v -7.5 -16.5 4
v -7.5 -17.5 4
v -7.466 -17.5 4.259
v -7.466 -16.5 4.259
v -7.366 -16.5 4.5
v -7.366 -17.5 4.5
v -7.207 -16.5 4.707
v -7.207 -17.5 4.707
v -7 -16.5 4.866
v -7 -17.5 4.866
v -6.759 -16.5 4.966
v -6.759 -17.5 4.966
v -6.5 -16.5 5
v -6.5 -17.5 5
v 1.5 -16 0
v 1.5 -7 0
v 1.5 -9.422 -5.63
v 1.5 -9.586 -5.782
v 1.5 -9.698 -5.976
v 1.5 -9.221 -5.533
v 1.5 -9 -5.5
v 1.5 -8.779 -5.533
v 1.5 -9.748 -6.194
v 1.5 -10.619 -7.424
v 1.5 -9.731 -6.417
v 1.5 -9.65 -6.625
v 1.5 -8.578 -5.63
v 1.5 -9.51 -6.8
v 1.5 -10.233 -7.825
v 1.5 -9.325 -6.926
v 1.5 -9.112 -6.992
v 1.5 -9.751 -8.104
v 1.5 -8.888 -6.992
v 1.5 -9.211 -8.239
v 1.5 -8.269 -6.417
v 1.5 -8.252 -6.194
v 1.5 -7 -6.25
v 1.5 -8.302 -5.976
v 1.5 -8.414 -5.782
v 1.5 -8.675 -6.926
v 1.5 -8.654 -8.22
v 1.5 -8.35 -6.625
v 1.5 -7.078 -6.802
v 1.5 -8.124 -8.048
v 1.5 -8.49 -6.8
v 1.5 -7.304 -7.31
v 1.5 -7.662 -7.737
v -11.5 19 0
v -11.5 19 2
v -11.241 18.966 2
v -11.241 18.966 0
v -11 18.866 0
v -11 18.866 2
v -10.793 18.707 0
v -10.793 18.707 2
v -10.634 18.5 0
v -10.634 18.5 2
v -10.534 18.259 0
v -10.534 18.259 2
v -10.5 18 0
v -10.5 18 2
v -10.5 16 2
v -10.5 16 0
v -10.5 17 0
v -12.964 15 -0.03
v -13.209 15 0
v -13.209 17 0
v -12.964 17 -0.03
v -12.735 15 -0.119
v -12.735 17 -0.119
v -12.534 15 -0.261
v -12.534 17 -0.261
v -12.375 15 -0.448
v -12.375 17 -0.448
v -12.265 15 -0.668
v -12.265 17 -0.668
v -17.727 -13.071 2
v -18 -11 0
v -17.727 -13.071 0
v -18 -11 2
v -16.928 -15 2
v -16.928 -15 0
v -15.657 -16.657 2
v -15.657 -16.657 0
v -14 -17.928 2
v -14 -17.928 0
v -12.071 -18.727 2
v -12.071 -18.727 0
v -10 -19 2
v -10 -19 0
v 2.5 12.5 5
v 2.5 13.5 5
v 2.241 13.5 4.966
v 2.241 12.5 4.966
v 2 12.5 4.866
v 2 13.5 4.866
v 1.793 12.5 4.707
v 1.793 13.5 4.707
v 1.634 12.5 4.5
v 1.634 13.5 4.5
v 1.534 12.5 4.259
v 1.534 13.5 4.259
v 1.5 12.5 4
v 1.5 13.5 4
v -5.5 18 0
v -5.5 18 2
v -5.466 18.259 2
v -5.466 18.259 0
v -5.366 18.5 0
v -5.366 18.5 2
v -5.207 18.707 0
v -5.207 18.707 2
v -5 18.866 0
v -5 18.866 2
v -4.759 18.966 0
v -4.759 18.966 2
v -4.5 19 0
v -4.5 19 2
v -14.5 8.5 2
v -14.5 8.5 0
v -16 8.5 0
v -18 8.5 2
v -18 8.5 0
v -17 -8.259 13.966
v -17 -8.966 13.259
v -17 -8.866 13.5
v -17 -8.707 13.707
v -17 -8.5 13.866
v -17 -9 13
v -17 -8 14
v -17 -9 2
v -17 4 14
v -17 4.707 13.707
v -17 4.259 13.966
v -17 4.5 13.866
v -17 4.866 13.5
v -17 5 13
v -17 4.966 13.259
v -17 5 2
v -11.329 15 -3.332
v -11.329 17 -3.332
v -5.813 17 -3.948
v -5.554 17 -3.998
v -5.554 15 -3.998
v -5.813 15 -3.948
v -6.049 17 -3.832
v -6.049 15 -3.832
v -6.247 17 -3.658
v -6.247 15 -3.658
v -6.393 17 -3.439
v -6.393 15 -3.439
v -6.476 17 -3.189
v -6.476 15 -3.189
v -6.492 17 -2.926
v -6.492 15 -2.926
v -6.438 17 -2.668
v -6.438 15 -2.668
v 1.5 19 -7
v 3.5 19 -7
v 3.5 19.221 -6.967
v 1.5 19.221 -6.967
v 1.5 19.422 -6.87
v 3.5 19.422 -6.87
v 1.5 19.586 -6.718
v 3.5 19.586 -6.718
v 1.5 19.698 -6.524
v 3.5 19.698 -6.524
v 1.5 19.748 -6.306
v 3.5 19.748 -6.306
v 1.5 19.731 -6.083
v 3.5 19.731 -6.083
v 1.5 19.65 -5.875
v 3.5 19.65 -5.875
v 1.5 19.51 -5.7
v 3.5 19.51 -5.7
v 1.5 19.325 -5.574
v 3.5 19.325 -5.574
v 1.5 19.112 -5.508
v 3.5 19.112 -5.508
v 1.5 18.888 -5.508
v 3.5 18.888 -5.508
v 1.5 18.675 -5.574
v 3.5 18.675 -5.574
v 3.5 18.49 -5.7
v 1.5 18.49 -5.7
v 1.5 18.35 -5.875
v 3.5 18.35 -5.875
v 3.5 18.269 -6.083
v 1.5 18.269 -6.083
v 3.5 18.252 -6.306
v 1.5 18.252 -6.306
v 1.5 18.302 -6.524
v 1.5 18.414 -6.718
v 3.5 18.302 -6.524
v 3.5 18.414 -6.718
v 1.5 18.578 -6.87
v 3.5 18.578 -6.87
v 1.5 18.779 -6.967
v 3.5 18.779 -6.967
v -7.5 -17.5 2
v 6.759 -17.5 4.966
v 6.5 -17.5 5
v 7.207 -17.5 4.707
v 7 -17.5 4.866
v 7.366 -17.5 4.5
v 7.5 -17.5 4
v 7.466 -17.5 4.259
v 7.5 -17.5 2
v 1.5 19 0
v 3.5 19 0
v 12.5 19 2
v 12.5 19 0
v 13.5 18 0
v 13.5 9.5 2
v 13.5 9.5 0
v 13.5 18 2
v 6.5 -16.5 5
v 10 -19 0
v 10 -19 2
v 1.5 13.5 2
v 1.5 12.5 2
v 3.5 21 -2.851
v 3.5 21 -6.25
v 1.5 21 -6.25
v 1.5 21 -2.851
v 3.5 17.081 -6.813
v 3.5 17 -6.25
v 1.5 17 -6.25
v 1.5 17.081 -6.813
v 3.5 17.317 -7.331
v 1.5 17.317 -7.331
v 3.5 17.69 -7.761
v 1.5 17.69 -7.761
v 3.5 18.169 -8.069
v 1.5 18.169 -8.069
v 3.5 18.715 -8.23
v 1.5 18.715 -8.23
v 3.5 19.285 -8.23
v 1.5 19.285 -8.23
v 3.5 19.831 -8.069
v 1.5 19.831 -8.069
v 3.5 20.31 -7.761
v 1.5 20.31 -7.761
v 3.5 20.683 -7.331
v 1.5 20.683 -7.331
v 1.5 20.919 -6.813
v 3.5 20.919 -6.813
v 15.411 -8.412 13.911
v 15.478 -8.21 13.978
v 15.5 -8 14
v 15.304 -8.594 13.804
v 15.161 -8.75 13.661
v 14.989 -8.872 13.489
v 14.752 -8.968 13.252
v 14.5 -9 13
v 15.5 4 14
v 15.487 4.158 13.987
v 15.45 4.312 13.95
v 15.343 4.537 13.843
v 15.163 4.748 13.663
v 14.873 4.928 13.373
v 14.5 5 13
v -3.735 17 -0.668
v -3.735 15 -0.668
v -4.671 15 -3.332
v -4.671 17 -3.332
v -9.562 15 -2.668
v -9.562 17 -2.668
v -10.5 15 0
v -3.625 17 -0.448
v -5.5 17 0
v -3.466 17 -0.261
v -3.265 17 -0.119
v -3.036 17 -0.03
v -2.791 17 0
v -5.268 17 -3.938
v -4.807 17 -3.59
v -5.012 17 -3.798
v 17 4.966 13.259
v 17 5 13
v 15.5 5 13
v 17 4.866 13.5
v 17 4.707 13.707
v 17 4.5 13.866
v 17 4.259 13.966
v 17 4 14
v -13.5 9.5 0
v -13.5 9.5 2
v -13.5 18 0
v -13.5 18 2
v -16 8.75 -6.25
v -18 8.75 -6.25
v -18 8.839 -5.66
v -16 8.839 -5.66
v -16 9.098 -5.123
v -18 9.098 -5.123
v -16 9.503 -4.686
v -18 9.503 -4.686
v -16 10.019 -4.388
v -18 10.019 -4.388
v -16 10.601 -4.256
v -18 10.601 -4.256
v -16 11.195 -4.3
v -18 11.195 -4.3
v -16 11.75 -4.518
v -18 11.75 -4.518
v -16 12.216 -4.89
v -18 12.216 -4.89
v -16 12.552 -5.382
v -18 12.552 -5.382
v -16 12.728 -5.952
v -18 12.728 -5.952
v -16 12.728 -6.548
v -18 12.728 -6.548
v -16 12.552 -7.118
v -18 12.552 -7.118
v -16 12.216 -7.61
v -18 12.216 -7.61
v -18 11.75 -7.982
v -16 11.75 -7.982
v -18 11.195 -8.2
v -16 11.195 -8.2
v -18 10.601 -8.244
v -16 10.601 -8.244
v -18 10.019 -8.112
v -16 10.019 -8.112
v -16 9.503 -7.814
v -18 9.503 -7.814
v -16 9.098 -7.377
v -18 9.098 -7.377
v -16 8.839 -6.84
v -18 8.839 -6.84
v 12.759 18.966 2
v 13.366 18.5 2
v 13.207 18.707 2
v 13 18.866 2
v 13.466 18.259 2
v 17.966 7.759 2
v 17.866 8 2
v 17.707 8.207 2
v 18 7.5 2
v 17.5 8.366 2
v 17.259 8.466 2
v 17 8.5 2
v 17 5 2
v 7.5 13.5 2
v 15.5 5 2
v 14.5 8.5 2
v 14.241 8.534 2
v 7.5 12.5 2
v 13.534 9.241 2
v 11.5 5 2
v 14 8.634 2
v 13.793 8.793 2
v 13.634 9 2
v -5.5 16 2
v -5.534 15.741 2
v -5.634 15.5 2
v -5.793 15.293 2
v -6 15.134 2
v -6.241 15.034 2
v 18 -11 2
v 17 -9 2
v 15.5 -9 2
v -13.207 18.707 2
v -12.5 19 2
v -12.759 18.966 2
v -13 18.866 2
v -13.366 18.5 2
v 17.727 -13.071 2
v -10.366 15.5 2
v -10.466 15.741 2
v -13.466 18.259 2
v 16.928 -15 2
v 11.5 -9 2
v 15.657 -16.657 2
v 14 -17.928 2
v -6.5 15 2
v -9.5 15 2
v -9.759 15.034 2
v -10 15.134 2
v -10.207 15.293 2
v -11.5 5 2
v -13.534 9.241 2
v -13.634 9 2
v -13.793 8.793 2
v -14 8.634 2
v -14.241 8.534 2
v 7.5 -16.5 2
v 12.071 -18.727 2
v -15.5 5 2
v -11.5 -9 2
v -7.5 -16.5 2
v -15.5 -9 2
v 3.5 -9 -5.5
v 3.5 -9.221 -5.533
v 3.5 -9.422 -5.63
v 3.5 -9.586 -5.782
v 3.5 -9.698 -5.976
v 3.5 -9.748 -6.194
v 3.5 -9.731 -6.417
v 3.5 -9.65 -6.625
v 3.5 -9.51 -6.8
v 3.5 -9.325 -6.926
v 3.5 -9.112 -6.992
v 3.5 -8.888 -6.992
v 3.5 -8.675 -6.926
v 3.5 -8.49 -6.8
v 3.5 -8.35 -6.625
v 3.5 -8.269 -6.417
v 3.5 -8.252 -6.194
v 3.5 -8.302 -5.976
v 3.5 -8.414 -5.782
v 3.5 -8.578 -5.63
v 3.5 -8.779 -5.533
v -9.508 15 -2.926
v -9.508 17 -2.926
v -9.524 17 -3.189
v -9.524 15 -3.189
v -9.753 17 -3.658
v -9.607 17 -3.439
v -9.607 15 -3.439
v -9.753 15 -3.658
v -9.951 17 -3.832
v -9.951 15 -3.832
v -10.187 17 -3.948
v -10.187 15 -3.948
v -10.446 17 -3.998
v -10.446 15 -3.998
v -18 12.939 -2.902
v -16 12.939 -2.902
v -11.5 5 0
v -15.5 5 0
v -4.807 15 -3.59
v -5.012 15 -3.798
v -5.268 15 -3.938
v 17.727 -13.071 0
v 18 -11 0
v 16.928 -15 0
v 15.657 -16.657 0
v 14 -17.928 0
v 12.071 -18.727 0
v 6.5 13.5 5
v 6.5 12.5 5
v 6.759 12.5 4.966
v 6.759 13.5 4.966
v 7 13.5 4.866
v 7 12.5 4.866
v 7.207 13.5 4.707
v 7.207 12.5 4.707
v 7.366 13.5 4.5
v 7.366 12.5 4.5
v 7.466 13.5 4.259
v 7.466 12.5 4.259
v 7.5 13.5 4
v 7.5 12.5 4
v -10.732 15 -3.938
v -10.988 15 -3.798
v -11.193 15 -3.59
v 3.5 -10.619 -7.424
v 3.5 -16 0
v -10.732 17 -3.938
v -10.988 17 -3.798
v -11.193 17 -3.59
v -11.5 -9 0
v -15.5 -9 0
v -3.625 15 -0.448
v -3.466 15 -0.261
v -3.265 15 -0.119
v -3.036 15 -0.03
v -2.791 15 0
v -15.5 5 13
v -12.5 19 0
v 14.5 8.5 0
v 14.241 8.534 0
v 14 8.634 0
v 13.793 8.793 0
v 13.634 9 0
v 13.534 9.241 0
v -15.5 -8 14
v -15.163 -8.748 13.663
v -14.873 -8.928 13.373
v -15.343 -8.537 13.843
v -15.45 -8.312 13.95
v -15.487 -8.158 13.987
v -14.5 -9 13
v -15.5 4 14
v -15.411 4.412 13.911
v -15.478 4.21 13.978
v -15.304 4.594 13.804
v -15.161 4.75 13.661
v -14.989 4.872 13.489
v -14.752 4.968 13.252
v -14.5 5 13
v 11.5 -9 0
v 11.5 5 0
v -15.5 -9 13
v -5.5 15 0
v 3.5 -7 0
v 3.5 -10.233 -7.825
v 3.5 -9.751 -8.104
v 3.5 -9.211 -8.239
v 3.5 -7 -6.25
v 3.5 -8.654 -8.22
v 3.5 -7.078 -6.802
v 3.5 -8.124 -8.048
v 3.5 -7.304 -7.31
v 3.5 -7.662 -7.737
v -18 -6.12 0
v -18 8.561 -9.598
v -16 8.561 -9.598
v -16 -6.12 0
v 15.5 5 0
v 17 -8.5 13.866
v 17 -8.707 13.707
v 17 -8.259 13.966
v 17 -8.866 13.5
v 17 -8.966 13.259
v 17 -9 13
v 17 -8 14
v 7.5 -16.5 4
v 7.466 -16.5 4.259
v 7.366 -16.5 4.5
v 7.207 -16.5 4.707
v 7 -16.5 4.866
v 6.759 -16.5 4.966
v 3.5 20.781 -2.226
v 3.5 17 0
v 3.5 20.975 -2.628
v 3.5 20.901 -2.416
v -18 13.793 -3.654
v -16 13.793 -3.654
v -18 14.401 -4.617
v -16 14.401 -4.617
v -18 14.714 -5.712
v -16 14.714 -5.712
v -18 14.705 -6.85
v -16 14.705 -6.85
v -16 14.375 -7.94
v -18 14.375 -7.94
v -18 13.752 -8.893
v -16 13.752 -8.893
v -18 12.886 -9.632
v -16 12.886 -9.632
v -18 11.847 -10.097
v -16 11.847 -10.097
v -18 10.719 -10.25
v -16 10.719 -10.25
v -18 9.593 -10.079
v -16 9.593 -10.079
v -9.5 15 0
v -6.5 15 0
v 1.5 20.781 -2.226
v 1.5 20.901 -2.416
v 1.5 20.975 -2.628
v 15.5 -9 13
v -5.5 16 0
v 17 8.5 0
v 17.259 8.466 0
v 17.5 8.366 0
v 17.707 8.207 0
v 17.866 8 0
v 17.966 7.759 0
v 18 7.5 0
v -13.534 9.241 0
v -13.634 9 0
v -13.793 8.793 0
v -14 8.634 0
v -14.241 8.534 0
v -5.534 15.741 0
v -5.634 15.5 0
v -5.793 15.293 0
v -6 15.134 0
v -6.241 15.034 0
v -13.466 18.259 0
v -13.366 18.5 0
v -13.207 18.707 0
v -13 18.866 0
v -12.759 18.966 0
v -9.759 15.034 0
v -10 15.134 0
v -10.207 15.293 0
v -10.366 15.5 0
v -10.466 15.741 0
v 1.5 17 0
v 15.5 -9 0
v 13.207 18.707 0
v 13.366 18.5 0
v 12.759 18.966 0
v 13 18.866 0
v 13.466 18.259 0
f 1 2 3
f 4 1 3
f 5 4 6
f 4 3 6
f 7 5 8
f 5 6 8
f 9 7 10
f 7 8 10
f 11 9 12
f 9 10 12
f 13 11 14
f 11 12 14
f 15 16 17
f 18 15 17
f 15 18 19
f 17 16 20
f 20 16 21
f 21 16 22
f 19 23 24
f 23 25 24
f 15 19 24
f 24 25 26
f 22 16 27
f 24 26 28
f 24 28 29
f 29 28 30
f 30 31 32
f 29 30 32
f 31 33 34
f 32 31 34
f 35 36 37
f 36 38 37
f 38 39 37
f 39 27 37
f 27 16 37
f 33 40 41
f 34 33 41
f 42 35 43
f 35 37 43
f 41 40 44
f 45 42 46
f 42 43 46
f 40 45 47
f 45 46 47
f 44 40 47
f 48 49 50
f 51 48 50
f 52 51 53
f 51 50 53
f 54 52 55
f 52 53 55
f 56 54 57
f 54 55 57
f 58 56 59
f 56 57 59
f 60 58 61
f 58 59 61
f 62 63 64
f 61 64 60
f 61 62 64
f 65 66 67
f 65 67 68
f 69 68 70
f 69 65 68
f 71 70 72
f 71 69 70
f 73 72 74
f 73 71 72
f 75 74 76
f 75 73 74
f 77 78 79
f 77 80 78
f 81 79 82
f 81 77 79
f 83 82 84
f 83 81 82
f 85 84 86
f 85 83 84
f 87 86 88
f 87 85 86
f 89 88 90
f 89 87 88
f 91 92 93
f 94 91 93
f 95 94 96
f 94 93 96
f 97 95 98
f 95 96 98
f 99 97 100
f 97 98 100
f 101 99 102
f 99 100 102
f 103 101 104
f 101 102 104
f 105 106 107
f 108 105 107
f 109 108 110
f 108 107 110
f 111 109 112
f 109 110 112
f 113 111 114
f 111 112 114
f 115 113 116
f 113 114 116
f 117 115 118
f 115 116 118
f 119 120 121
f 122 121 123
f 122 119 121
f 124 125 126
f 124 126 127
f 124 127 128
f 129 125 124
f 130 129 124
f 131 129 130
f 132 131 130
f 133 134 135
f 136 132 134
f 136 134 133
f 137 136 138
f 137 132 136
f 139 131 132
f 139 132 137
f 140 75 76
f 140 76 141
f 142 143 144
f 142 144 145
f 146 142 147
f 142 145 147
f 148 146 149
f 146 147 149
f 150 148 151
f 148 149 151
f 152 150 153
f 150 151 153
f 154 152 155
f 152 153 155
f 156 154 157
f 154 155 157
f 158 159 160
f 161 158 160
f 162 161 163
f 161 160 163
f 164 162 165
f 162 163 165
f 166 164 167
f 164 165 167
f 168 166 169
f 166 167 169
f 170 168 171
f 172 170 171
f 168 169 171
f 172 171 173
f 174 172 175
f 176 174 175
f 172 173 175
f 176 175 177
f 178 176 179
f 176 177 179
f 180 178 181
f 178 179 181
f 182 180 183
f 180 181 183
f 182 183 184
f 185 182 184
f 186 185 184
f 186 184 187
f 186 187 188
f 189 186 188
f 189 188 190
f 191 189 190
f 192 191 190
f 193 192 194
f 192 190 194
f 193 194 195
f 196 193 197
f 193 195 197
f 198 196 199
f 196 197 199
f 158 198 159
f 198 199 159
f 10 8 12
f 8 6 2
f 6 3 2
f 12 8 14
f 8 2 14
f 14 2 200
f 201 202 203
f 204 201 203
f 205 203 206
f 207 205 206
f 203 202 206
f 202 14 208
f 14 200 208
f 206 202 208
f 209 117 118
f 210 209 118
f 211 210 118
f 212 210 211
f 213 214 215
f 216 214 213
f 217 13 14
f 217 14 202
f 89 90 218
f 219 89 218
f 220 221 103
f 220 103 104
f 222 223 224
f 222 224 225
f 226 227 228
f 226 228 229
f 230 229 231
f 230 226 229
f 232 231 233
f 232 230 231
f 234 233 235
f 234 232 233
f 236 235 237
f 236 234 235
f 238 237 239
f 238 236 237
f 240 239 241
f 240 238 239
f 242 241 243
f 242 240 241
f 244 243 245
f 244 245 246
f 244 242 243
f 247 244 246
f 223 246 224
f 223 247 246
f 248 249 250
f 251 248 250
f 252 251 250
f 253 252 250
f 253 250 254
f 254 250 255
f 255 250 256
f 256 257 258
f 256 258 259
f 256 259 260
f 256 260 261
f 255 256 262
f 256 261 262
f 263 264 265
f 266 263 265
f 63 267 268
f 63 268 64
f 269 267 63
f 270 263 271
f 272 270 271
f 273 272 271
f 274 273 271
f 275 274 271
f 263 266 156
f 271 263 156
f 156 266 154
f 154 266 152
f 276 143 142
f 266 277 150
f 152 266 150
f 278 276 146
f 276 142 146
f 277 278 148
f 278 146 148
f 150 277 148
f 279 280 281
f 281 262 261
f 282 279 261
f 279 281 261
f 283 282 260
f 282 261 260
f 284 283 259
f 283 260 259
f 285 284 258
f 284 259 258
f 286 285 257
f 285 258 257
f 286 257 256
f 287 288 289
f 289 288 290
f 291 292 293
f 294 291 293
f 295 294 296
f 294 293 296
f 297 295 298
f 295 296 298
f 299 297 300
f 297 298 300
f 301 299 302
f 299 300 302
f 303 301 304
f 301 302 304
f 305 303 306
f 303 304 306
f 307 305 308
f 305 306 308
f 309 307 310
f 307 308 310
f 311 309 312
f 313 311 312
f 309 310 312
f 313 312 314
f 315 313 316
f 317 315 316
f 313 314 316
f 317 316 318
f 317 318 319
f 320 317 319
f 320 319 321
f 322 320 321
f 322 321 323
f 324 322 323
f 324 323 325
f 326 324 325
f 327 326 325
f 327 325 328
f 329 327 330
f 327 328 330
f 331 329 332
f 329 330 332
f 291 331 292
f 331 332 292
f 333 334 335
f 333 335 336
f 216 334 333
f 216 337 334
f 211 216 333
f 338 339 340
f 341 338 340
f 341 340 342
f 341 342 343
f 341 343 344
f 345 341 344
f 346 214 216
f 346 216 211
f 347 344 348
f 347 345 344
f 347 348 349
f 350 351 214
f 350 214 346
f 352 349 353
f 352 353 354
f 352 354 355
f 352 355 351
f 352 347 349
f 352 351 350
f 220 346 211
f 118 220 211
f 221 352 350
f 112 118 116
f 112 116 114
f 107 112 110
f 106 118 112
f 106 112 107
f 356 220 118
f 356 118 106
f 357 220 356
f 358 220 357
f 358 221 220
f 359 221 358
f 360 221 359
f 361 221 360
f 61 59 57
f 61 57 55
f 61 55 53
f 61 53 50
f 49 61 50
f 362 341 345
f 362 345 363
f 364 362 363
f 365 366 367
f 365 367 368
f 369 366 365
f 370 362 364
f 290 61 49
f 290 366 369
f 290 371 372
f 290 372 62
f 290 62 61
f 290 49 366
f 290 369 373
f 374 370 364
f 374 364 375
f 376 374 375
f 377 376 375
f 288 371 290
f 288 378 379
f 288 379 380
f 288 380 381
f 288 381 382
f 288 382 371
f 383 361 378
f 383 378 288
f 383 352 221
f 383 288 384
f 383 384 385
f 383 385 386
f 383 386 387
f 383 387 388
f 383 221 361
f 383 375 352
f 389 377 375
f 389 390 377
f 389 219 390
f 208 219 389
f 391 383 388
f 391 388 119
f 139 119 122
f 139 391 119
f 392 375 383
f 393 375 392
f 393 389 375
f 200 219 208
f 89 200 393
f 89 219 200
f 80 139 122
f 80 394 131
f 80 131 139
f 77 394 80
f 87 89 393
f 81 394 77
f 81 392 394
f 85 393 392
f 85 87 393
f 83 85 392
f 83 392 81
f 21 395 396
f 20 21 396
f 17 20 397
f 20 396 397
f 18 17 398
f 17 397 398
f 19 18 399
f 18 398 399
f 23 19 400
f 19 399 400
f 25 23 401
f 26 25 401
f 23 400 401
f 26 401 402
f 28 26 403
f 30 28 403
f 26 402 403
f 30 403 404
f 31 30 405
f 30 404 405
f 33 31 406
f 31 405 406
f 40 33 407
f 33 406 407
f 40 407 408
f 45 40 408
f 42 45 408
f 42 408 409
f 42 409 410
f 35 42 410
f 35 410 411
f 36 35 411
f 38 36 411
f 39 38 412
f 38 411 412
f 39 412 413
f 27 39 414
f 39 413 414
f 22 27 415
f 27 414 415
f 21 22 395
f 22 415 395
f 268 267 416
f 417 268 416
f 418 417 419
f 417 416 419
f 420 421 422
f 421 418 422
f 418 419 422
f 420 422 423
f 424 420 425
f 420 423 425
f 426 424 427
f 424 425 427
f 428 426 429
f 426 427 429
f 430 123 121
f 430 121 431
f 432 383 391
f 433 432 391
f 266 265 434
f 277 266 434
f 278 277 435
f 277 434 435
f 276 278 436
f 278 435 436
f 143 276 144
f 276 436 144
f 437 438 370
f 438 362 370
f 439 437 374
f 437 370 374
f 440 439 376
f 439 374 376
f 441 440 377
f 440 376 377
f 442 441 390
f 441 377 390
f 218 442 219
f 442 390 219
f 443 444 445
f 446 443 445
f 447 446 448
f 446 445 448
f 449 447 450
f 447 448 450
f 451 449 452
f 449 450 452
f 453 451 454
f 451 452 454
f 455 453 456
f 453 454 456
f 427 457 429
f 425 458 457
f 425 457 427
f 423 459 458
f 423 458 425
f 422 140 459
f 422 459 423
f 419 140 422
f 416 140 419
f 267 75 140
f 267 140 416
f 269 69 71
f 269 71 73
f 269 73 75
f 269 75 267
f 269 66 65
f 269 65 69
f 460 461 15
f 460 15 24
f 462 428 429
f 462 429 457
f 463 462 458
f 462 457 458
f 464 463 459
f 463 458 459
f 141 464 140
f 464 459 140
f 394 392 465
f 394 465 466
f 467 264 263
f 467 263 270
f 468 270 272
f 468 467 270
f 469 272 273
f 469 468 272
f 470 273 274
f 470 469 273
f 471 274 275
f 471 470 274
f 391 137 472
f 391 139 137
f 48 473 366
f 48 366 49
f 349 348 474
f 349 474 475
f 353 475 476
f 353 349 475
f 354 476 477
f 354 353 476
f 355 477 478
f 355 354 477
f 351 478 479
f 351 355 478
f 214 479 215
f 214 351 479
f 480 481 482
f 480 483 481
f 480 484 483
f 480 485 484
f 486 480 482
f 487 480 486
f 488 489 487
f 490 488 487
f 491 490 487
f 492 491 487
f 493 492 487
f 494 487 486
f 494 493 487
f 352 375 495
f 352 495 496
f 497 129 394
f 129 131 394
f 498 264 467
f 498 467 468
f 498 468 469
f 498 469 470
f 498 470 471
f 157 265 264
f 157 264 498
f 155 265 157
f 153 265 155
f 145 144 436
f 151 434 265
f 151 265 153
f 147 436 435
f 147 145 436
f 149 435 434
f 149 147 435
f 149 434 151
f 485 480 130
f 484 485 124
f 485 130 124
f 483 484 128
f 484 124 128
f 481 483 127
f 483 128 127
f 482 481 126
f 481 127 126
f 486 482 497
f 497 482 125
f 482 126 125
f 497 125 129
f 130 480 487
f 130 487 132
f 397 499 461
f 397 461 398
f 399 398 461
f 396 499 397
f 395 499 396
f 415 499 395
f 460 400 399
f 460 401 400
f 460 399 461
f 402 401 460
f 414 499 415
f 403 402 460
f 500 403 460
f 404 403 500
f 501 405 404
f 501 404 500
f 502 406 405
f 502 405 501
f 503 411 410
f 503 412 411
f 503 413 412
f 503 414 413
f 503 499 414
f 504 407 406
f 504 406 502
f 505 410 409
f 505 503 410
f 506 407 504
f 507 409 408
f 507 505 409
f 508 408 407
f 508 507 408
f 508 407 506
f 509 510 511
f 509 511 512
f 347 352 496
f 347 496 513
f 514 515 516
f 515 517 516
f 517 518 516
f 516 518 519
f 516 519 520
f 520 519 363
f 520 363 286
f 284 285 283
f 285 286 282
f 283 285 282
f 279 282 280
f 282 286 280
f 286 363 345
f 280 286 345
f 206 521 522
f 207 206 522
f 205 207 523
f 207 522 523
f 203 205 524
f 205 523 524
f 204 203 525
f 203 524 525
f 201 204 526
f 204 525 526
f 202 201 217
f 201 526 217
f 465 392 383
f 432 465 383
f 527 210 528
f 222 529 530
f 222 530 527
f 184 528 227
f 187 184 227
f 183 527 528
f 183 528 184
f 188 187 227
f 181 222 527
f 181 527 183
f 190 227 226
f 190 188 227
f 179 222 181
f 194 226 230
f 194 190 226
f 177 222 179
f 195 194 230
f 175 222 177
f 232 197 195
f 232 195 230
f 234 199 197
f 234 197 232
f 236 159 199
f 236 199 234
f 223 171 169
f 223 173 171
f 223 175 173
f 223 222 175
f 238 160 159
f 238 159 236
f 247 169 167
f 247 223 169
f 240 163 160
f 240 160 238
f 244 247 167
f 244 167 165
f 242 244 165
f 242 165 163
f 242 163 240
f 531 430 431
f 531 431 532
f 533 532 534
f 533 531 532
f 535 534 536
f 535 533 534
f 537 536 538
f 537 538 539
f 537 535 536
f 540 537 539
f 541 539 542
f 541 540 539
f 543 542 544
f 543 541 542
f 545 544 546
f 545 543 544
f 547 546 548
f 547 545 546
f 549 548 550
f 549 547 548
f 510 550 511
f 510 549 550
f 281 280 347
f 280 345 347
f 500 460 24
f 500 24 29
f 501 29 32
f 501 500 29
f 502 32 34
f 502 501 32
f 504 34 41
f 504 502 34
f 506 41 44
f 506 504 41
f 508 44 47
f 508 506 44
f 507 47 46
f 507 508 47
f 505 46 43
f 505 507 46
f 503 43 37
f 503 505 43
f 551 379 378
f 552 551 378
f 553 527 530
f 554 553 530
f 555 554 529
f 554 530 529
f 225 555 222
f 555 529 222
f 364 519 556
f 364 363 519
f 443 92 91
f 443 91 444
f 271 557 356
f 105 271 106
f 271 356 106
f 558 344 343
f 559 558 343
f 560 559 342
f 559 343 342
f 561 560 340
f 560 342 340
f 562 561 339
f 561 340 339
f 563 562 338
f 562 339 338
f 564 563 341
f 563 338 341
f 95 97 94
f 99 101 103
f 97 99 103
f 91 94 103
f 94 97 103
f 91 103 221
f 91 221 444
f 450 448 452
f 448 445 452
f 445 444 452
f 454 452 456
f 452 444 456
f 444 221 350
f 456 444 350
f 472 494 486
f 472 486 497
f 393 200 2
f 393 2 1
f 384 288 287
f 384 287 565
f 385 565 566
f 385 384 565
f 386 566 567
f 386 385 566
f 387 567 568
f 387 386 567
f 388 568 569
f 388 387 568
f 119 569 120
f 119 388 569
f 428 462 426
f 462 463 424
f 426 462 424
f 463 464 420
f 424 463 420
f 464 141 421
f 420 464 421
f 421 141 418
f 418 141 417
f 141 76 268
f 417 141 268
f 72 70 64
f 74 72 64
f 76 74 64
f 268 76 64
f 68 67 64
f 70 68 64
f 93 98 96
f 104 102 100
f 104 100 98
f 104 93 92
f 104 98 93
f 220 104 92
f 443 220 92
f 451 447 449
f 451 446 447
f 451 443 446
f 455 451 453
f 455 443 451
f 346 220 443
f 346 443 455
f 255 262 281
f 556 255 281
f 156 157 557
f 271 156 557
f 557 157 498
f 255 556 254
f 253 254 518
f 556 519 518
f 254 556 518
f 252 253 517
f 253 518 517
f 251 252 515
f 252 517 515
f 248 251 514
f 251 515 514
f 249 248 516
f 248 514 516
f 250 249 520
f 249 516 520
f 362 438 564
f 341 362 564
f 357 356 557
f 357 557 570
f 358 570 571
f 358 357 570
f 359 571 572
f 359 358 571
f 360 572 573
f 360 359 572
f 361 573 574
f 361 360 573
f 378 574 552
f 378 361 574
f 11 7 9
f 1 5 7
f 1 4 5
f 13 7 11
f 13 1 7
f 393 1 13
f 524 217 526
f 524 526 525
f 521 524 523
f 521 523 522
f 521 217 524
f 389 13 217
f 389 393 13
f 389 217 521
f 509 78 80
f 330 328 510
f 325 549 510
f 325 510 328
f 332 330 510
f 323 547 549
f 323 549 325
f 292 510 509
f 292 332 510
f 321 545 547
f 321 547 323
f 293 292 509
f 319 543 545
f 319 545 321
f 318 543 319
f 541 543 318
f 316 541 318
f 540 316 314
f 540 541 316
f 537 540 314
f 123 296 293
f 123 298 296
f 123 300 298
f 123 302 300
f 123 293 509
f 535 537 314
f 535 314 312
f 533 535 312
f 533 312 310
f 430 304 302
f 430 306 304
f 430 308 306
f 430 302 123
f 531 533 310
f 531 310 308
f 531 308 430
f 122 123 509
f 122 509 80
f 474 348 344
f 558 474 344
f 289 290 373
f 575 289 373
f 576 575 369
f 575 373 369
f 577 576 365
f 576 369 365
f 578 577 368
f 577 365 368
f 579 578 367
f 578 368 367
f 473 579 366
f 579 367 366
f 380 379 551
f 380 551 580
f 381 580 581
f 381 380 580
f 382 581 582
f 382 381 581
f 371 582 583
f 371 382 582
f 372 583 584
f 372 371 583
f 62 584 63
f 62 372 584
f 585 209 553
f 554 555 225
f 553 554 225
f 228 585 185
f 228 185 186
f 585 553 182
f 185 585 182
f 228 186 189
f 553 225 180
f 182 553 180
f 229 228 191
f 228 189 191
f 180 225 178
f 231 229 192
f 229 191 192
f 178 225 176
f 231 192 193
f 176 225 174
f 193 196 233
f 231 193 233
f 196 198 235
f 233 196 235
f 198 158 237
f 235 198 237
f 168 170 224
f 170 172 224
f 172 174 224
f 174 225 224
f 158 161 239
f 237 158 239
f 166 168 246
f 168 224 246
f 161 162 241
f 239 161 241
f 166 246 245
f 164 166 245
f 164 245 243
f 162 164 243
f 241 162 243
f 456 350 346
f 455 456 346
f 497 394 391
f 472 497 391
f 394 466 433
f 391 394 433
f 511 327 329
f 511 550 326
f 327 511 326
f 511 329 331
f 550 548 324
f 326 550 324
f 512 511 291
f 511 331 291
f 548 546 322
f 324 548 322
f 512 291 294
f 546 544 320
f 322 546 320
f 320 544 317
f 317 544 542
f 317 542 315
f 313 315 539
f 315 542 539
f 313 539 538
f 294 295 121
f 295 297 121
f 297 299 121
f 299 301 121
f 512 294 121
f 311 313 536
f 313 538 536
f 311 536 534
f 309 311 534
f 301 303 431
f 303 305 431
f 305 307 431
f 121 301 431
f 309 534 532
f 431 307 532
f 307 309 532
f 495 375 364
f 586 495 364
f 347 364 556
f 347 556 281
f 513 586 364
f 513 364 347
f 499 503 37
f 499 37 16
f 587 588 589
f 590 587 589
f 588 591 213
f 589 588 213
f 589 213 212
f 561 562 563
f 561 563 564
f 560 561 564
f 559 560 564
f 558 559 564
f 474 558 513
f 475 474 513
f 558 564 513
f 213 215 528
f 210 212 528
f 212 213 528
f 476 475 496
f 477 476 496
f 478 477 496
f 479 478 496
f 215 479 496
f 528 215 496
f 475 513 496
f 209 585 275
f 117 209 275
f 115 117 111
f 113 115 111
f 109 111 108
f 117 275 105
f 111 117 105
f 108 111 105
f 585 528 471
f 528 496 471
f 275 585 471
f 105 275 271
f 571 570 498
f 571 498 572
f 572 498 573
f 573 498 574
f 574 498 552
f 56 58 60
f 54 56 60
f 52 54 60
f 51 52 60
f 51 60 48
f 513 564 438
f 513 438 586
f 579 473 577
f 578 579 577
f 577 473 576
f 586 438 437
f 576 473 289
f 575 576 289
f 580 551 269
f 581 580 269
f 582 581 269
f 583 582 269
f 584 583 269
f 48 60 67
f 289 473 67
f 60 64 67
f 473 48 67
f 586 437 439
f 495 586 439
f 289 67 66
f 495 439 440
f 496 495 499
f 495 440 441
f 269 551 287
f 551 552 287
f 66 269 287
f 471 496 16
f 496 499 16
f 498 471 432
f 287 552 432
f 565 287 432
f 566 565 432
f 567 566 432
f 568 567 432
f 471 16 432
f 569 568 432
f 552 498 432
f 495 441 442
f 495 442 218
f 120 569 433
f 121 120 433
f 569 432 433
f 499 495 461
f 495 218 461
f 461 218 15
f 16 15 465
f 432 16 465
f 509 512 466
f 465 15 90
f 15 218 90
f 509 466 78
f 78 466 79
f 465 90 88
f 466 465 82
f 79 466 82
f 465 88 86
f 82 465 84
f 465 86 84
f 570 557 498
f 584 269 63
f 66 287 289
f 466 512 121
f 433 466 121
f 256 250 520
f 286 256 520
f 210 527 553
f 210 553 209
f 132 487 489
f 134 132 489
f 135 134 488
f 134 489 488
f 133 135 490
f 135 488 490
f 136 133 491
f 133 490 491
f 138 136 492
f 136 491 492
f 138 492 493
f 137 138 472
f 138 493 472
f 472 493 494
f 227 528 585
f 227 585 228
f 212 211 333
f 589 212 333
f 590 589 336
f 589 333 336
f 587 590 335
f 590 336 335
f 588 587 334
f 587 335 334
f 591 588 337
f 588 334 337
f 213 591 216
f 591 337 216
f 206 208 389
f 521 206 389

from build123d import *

# Parameters (mm, degrees)
SKETCH_1_W          = 36
SKETCH_1_H          = 38
EXTRUDE_1_DEPTH     = 2
CUT_EXTRUDE_1_REACH = 28.249
SKETCH_2_W          = 4
SKETCH_2_H          = 14
SKETCH_2_W_2        = 4.5
SKETCH_2_H_2        = 10.5
SKETCH_2_3_W        = 1.5
SKETCH_2_3_H        = 14
EXTRUDE_2_DEPTH     = 12
EXTRUDE_3_DEPTH     = 14
SKETCH_4_W          = 15
SKETCH_4_H          = 1
SKETCH_4_W_2        = 6
EXTRUDE_4_DEPTH     = 3
CUT_EXTRUDE_2_REACH = 30.792
SKETCH_5_W          = 5
SKETCH_5_H          = 4
SKETCH_6_R          = 0.75
EXTRUDE_5_DEPTH     = 2
SKETCH_7_R          = 2
EXTRUDE_6_DEPTH     = 2
EXTRUDE_7_DEPTH     = 2
FILLET_1_R          = 8
FILLET_2_R          = 1


with BuildPart() as part:
    # 草图1 → 凸台-拉伸1 (new body)
    with BuildSketch(Plane.XY):
        Rectangle(SKETCH_1_W, SKETCH_1_H)
    extrude(amount=EXTRUDE_1_DEPTH)

    # 草图2 → 切除-拉伸1 (cut, up to next)
    with BuildSketch(Plane.XY.offset(2), mode=Mode.PRIVATE) as cut_extrude_1_sk1:
        with Locations((13.5, -2)):
            Rectangle(SKETCH_2_W, SKETCH_2_H)
    cut_extrude_1_tool1 = extrude(cut_extrude_1_sk1.sketch, amount=-CUT_EXTRUDE_1_REACH, mode=Mode.PRIVATE) & part.part
    # 草图2 → 切除-拉伸1 (cut, up to next)
    with BuildSketch(Plane.XY.offset(2), mode=Mode.PRIVATE) as cut_extrude_1_sk2:
        with Locations((15.75, 13.75)):
            Rectangle(SKETCH_2_W_2, SKETCH_2_H_2)
    cut_extrude_1_tool2 = extrude(cut_extrude_1_sk2.sketch, amount=-CUT_EXTRUDE_1_REACH, mode=Mode.PRIVATE) & part.part
    cut_extrude_1_1 = cut_extrude_1_tool1.solids().sort_by_distance((13.5, -2, 2))[0]
    add(cut_extrude_1_1, mode=Mode.SUBTRACT)
    cut_extrude_1_2 = cut_extrude_1_tool2.solids().sort_by_distance((15.75, 13.75, 2))[0]
    add(cut_extrude_1_2, mode=Mode.SUBTRACT)
    cut_extrude_1 = cut_extrude_1_1 + cut_extrude_1_2  # 切除-拉伸1 as one shape, for the pattern or mirror that repeats it

    # 草图2<3> → 凸台-拉伸2 (add)
    with BuildSketch(Plane.XY.offset(2)):
        with Locations((16.25, -2)):
            Rectangle(SKETCH_2_3_W, SKETCH_2_3_H)
    extrude_2 = extrude(amount=EXTRUDE_2_DEPTH)

    # 草图3 → 凸台-拉伸3 (add)
    with BuildSketch(Plane(origin=(0, 5, 0), x_dir=(1, 0, 0), z_dir=(0, 1, 0))):
        Polygon((15.5, -14), (14.5, -13), (15.5, -13), align=None)
    extrude_3 = extrude(amount=-EXTRUDE_3_DEPTH)

    # 镜向1: 切除-拉伸1, 凸台-拉伸2, 凸台-拉伸3 across plane
    add(cut_extrude_1.mirror(Plane(origin=(0, 0, 0), x_dir=(0, 0, 1), z_dir=(1, 0, 0))), mode=Mode.SUBTRACT)
    add(extrude_2.mirror(Plane(origin=(0, 0, 0), x_dir=(0, 0, 1), z_dir=(1, 0, 0))))
    add(extrude_3.mirror(Plane(origin=(0, 0, 0), x_dir=(0, 0, 1), z_dir=(1, 0, 0))))

    # 草图4 → 凸台-拉伸4 (add)
    with BuildSketch(Plane.XY.offset(2)):
        with Locations((0, -17)):
            Rectangle(SKETCH_4_W, SKETCH_4_H)
        with Locations((4.5, 13)):
            Rectangle(SKETCH_4_W_2, SKETCH_4_H)
    extrude(amount=EXTRUDE_4_DEPTH)

    # 草图5 → 切除-拉伸2 (cut, up to next)
    with BuildSketch(Plane.XY.offset(2), mode=Mode.PRIVATE) as cut_extrude_2_sk1:
        with Locations((-8, 17)):
            Rectangle(SKETCH_5_W, SKETCH_5_H)
    cut_extrude_2_tool1 = extrude(cut_extrude_2_sk1.sketch, amount=-CUT_EXTRUDE_2_REACH, mode=Mode.PRIVATE) & part.part
    add(cut_extrude_2_tool1.solids().sort_by_distance((-8, 17, 2))[0], mode=Mode.SUBTRACT)

    # 草图6 → 凸台-拉伸5 (add)
    # profile 1 of 2: a face of its own
    with BuildSketch(Plane(origin=(3.5, 0, 0), x_dir=(0, 0, -1), z_dir=(1, 0, 0))):
        with BuildLine():
            Line((2.5, 21), (0, 19))
            Line((0, 19), (0, 17))
            Line((0, 17), (6.25, 17))
            ThreePointArc((6.25, 17), (8.25, 19), (6.25, 21))
            Line((6.25, 21), (2.5, 21))
        make_face()
        with Locations((6.25, 19)):
            Circle(SKETCH_6_R, mode=Mode.SUBTRACT)
    # profile 2 of 2: a face of its own
    with BuildSketch(Plane(origin=(3.5, 0, 0), x_dir=(0, 0, -1), z_dir=(1, 0, 0))):
        with BuildLine():
            ThreePointArc((7.423710101, -10.619384019), (8.152467876, -8.383059175), (6.25, -7))
            Line((6.25, -7), (0, -7))
            Line((0, -7), (0, -16))
            Line((0, -16), (7.423710101, -10.619384019))
        make_face()
        with Locations(Location((6.25, -9, 0), (0, 0, 180))):
            Circle(SKETCH_6_R, mode=Mode.SUBTRACT)
    extrude(amount=-EXTRUDE_5_DEPTH)

    # 草图7 → 凸台-拉伸6 (add)
    with BuildSketch(Plane.ZY.offset(18)):
        with BuildLine():
            Line((0, -6.119622458), (0, 8.5))
            Line((0, 8.5), (-2.902017955, 12.938839014))
            ThreePointArc((-2.902017955, 12.938839014), (-8.438839014, 14.097982045), (-9.597982045, 8.561160986))
            Line((-9.597982045, 8.561160986), (0, -6.119622458))
        make_face()
        with Locations(Location((-6.25, 10.75, 0), (0, 0, 270))):
            Circle(SKETCH_7_R, mode=Mode.SUBTRACT)
    extrude(amount=-EXTRUDE_6_DEPTH)

    # 草图8 → 凸台-拉伸7 (add)
    with BuildSketch(Plane(origin=(0, 15, 0), x_dir=(1, 0, 0), z_dir=(0, 1, 0))):
        Polygon((-10.5, 0), (-12.5, 0), (-11.09431212, 4), (-9.09431212, 4), align=None)
        Polygon((-4.90568788, 4), (-6.90568788, 4), (-5.5, 0), (-3.5, 0), align=None)
    extrude(amount=EXTRUDE_7_DEPTH)

    # 圆角1
    fillet_1_edges = [part.edges().sort_by_distance(p)[0] for p in [
        (18, -19, 1),
        (-18, -19, 1),
    ]]
    fillet(fillet_1_edges, radius=FILLET_1_R)

    # 圆角2
    # the kernel refuses this fillet: 1 mm, written as the material it adds along each edge
    with BuildSketch(Plane(origin=(-13.5, 8.5, 2), x_dir=(-1, 0, 0), z_dir=(0, 0, -1)), Plane(origin=(-10.5, 15, 2), x_dir=(0, 1, 0), z_dir=(0, 0, -1)), Plane(origin=(-5.5, 15, 2), x_dir=(-1, 0, 0), z_dir=(0, 0, -1))) as fillet_2_piece_1:
        with BuildLine():
            CenterArc((FILLET_2_R, FILLET_2_R), FILLET_2_R, 180, 90)
            Line((0, FILLET_2_R), (0, 0))
            Line((0, 0), (FILLET_2_R, 0))
        make_face()
    extrude(amount=2)
    with BuildSketch(Plane(origin=(-12.5, 15, 0), x_dir=(-1, 0, 0), z_dir=(0, 1, 0))) as fillet_2_piece_2:
        with BuildLine():
            CenterArc((FILLET_2_R * 0.708529633191, -FILLET_2_R), FILLET_2_R, 90, 70.63740436)
            Line((-FILLET_2_R * 0.234909668247, -FILLET_2_R * 0.668454702186), (0, 0))
            Line((0, 0), (FILLET_2_R * 0.708529633191, 0))
        make_face()
    extrude(amount=2)
    with BuildSketch(Plane(origin=(-3.5, 15, 0), x_dir=(1, 0, 0), z_dir=(0, 1, 0))) as fillet_2_piece_3:
        with BuildLine():
            CenterArc((FILLET_2_R * 0.708529633191, FILLET_2_R), FILLET_2_R, 199.36259564, 70.63740436)
            Line((-FILLET_2_R * 0.234909668247, FILLET_2_R * 0.668454702186), (0, 0))
            Line((0, 0), (FILLET_2_R * 0.708529633191, 0))
        make_face()
    extrude(amount=2)
    with BuildSketch(Plane(origin=(13.5, 8.5, 2), x_dir=(1, 0, 0), z_dir=(0, 0, -1))) as fillet_2_piece_4:
        with BuildLine():
            CenterArc((FILLET_2_R, -FILLET_2_R), FILLET_2_R, 90, 90)
            Line((0, -FILLET_2_R), (0, 0))
            Line((0, 0), (FILLET_2_R, 0))
        make_face()
    extrude(amount=2)
    # the kernel refuses this fillet: 1 mm, written as the material it takes off along each edge
    with BuildSketch(Plane(origin=(19.5, -9, 14), x_dir=(0, 1, 0), z_dir=(-1, 0, 0)), Plane(origin=(13, 5, 14), x_dir=(0, -1, 0), z_dir=(1, 0, 0)), Plane(origin=(-19.5, -9, 14), x_dir=(0, 0, -1), z_dir=(1, 0, 0))) as fillet_2_2_piece_1:
        with BuildLine():
            CenterArc((FILLET_2_R, FILLET_2_R), FILLET_2_R, 180, 90)
            Line((0, FILLET_2_R), (0, 0))
            Line((0, 0), (FILLET_2_R, 0))
        make_face()
    extrude(amount=6.5, mode=Mode.SUBTRACT)
    with BuildSketch(Plane(origin=(-13, 5, 14), x_dir=(0, -1, 0), z_dir=(-1, 0, 0))) as fillet_2_2_piece_2:
        with BuildLine():
            CenterArc((FILLET_2_R, -FILLET_2_R), FILLET_2_R, 90, 90)
            Line((0, -FILLET_2_R), (0, 0))
            Line((0, 0), (FILLET_2_R, 0))
        make_face()
    extrude(amount=6.5, mode=Mode.SUBTRACT)
    with BuildSketch(Plane(origin=(-7.5, -20, 5), x_dir=(1, 0, 0), z_dir=(0, 1, 0)), Plane(origin=(1.5, 16, 5), x_dir=(0, 0, -1), z_dir=(0, -1, 0))) as fillet_2_2_piece_3:
        with BuildLine():
            CenterArc((FILLET_2_R, FILLET_2_R), FILLET_2_R, 180, 90)
            Line((0, FILLET_2_R), (0, 0))
            Line((0, 0), (FILLET_2_R, 0))
        make_face()
    extrude(amount=6, mode=Mode.SUBTRACT)
    with BuildSketch(Plane(origin=(7.5, -14, 5), x_dir=(0, 0, -1), z_dir=(0, -1, 0)), Plane(origin=(7.5, 10, 5), x_dir=(-1, 0, 0), z_dir=(0, 1, 0))) as fillet_2_2_piece_4:
        with BuildLine():
            CenterArc((FILLET_2_R, -FILLET_2_R), FILLET_2_R, 90, 90)
            Line((0, -FILLET_2_R), (0, 0))
            Line((0, 0), (FILLET_2_R, 0))
        make_face()
    extrude(amount=6, mode=Mode.SUBTRACT)
    with BuildSketch(Plane(origin=(-13.5, 19, 4.5), x_dir=(1, 0, 0), z_dir=(0, 0, -1)), Plane(origin=(-10.5, 19, 4.5), x_dir=(0, -1, 0), z_dir=(0, 0, -1)), Plane(origin=(-5.5, 19, 4.5), x_dir=(1, 0, 0), z_dir=(0, 0, -1)), Plane(origin=(18, 8.5, 4.5), x_dir=(0, -1, 0), z_dir=(0, 0, -1)), Plane(origin=(13.5, 19, 4.5), x_dir=(0, -1, 0), z_dir=(0, 0, -1))) as fillet_2_2_piece_5:
        with BuildLine():
            CenterArc((FILLET_2_R, FILLET_2_R), FILLET_2_R, 180, 90)
            Line((0, FILLET_2_R), (0, 0))
            Line((0, 0), (FILLET_2_R, 0))
        make_face()
    extrude(amount=7, mode=Mode.SUBTRACT)
    with BuildSketch(Plane(origin=(-4.90568788, 13.228675917, -4), x_dir=(0.33154529781413966, 0, 0.9434393014377414), z_dir=(0, 1, 0)), Plane(origin=(-11.09431212, 13.228675917, -4), x_dir=(1, 0, 0), z_dir=(0, 1, 0))) as fillet_2_2_piece_6:
        with BuildLine():
            CenterArc((FILLET_2_R * 0.708529633191, -FILLET_2_R), FILLET_2_R, 90, 70.63740436)
            Line((-FILLET_2_R * 0.234909668247, -FILLET_2_R * 0.668454702186), (0, 0))
            Line((0, 0), (FILLET_2_R * 0.708529633191, 0))
        make_face()
    extrude(amount=5.542648166, mode=Mode.SUBTRACT)
    with BuildSketch(Plane(origin=(-9.09431212, 11.471566067, -4), x_dir=(-0.33154529781413894, 0, 0.9434393014377417), z_dir=(0, 1, 0)), Plane(origin=(-6.90568788, 11.471566067, -4), x_dir=(1, 0, 0), z_dir=(0, 1, 0))) as fillet_2_2_piece_7:
        with BuildLine():
            CenterArc((FILLET_2_R * 1.41137357304, -FILLET_2_R), FILLET_2_R, 90, 109.36259564)
            Line((FILLET_2_R * 0.4679342716, -FILLET_2_R * 1.33154529781), (0, 0))
            Line((0, 0), (FILLET_2_R * 1.41137357304, 0))
        make_face()
    extrude(amount=9.056867865, mode=Mode.SUBTRACT)
    with BuildSketch(Plane(origin=(4.376952648, 21, -2.5), x_dir=(0, -0.6246950475544217, 0.7808688094430323), z_dir=(-1, 0, 0))) as fillet_2_2_piece_8:
        with BuildLine():
            CenterArc((FILLET_2_R * 0.350781059358, -FILLET_2_R), FILLET_2_R, 90, 38.659808254)
            Line((-FILLET_2_R * 0.273913988196, -FILLET_2_R * 0.219131190557), (0, 0))
            Line((0, 0), (FILLET_2_R * 0.350781059358, 0))
        make_face()
    extrude(amount=3.753905297, mode=Mode.SUBTRACT)


solid = part.part
